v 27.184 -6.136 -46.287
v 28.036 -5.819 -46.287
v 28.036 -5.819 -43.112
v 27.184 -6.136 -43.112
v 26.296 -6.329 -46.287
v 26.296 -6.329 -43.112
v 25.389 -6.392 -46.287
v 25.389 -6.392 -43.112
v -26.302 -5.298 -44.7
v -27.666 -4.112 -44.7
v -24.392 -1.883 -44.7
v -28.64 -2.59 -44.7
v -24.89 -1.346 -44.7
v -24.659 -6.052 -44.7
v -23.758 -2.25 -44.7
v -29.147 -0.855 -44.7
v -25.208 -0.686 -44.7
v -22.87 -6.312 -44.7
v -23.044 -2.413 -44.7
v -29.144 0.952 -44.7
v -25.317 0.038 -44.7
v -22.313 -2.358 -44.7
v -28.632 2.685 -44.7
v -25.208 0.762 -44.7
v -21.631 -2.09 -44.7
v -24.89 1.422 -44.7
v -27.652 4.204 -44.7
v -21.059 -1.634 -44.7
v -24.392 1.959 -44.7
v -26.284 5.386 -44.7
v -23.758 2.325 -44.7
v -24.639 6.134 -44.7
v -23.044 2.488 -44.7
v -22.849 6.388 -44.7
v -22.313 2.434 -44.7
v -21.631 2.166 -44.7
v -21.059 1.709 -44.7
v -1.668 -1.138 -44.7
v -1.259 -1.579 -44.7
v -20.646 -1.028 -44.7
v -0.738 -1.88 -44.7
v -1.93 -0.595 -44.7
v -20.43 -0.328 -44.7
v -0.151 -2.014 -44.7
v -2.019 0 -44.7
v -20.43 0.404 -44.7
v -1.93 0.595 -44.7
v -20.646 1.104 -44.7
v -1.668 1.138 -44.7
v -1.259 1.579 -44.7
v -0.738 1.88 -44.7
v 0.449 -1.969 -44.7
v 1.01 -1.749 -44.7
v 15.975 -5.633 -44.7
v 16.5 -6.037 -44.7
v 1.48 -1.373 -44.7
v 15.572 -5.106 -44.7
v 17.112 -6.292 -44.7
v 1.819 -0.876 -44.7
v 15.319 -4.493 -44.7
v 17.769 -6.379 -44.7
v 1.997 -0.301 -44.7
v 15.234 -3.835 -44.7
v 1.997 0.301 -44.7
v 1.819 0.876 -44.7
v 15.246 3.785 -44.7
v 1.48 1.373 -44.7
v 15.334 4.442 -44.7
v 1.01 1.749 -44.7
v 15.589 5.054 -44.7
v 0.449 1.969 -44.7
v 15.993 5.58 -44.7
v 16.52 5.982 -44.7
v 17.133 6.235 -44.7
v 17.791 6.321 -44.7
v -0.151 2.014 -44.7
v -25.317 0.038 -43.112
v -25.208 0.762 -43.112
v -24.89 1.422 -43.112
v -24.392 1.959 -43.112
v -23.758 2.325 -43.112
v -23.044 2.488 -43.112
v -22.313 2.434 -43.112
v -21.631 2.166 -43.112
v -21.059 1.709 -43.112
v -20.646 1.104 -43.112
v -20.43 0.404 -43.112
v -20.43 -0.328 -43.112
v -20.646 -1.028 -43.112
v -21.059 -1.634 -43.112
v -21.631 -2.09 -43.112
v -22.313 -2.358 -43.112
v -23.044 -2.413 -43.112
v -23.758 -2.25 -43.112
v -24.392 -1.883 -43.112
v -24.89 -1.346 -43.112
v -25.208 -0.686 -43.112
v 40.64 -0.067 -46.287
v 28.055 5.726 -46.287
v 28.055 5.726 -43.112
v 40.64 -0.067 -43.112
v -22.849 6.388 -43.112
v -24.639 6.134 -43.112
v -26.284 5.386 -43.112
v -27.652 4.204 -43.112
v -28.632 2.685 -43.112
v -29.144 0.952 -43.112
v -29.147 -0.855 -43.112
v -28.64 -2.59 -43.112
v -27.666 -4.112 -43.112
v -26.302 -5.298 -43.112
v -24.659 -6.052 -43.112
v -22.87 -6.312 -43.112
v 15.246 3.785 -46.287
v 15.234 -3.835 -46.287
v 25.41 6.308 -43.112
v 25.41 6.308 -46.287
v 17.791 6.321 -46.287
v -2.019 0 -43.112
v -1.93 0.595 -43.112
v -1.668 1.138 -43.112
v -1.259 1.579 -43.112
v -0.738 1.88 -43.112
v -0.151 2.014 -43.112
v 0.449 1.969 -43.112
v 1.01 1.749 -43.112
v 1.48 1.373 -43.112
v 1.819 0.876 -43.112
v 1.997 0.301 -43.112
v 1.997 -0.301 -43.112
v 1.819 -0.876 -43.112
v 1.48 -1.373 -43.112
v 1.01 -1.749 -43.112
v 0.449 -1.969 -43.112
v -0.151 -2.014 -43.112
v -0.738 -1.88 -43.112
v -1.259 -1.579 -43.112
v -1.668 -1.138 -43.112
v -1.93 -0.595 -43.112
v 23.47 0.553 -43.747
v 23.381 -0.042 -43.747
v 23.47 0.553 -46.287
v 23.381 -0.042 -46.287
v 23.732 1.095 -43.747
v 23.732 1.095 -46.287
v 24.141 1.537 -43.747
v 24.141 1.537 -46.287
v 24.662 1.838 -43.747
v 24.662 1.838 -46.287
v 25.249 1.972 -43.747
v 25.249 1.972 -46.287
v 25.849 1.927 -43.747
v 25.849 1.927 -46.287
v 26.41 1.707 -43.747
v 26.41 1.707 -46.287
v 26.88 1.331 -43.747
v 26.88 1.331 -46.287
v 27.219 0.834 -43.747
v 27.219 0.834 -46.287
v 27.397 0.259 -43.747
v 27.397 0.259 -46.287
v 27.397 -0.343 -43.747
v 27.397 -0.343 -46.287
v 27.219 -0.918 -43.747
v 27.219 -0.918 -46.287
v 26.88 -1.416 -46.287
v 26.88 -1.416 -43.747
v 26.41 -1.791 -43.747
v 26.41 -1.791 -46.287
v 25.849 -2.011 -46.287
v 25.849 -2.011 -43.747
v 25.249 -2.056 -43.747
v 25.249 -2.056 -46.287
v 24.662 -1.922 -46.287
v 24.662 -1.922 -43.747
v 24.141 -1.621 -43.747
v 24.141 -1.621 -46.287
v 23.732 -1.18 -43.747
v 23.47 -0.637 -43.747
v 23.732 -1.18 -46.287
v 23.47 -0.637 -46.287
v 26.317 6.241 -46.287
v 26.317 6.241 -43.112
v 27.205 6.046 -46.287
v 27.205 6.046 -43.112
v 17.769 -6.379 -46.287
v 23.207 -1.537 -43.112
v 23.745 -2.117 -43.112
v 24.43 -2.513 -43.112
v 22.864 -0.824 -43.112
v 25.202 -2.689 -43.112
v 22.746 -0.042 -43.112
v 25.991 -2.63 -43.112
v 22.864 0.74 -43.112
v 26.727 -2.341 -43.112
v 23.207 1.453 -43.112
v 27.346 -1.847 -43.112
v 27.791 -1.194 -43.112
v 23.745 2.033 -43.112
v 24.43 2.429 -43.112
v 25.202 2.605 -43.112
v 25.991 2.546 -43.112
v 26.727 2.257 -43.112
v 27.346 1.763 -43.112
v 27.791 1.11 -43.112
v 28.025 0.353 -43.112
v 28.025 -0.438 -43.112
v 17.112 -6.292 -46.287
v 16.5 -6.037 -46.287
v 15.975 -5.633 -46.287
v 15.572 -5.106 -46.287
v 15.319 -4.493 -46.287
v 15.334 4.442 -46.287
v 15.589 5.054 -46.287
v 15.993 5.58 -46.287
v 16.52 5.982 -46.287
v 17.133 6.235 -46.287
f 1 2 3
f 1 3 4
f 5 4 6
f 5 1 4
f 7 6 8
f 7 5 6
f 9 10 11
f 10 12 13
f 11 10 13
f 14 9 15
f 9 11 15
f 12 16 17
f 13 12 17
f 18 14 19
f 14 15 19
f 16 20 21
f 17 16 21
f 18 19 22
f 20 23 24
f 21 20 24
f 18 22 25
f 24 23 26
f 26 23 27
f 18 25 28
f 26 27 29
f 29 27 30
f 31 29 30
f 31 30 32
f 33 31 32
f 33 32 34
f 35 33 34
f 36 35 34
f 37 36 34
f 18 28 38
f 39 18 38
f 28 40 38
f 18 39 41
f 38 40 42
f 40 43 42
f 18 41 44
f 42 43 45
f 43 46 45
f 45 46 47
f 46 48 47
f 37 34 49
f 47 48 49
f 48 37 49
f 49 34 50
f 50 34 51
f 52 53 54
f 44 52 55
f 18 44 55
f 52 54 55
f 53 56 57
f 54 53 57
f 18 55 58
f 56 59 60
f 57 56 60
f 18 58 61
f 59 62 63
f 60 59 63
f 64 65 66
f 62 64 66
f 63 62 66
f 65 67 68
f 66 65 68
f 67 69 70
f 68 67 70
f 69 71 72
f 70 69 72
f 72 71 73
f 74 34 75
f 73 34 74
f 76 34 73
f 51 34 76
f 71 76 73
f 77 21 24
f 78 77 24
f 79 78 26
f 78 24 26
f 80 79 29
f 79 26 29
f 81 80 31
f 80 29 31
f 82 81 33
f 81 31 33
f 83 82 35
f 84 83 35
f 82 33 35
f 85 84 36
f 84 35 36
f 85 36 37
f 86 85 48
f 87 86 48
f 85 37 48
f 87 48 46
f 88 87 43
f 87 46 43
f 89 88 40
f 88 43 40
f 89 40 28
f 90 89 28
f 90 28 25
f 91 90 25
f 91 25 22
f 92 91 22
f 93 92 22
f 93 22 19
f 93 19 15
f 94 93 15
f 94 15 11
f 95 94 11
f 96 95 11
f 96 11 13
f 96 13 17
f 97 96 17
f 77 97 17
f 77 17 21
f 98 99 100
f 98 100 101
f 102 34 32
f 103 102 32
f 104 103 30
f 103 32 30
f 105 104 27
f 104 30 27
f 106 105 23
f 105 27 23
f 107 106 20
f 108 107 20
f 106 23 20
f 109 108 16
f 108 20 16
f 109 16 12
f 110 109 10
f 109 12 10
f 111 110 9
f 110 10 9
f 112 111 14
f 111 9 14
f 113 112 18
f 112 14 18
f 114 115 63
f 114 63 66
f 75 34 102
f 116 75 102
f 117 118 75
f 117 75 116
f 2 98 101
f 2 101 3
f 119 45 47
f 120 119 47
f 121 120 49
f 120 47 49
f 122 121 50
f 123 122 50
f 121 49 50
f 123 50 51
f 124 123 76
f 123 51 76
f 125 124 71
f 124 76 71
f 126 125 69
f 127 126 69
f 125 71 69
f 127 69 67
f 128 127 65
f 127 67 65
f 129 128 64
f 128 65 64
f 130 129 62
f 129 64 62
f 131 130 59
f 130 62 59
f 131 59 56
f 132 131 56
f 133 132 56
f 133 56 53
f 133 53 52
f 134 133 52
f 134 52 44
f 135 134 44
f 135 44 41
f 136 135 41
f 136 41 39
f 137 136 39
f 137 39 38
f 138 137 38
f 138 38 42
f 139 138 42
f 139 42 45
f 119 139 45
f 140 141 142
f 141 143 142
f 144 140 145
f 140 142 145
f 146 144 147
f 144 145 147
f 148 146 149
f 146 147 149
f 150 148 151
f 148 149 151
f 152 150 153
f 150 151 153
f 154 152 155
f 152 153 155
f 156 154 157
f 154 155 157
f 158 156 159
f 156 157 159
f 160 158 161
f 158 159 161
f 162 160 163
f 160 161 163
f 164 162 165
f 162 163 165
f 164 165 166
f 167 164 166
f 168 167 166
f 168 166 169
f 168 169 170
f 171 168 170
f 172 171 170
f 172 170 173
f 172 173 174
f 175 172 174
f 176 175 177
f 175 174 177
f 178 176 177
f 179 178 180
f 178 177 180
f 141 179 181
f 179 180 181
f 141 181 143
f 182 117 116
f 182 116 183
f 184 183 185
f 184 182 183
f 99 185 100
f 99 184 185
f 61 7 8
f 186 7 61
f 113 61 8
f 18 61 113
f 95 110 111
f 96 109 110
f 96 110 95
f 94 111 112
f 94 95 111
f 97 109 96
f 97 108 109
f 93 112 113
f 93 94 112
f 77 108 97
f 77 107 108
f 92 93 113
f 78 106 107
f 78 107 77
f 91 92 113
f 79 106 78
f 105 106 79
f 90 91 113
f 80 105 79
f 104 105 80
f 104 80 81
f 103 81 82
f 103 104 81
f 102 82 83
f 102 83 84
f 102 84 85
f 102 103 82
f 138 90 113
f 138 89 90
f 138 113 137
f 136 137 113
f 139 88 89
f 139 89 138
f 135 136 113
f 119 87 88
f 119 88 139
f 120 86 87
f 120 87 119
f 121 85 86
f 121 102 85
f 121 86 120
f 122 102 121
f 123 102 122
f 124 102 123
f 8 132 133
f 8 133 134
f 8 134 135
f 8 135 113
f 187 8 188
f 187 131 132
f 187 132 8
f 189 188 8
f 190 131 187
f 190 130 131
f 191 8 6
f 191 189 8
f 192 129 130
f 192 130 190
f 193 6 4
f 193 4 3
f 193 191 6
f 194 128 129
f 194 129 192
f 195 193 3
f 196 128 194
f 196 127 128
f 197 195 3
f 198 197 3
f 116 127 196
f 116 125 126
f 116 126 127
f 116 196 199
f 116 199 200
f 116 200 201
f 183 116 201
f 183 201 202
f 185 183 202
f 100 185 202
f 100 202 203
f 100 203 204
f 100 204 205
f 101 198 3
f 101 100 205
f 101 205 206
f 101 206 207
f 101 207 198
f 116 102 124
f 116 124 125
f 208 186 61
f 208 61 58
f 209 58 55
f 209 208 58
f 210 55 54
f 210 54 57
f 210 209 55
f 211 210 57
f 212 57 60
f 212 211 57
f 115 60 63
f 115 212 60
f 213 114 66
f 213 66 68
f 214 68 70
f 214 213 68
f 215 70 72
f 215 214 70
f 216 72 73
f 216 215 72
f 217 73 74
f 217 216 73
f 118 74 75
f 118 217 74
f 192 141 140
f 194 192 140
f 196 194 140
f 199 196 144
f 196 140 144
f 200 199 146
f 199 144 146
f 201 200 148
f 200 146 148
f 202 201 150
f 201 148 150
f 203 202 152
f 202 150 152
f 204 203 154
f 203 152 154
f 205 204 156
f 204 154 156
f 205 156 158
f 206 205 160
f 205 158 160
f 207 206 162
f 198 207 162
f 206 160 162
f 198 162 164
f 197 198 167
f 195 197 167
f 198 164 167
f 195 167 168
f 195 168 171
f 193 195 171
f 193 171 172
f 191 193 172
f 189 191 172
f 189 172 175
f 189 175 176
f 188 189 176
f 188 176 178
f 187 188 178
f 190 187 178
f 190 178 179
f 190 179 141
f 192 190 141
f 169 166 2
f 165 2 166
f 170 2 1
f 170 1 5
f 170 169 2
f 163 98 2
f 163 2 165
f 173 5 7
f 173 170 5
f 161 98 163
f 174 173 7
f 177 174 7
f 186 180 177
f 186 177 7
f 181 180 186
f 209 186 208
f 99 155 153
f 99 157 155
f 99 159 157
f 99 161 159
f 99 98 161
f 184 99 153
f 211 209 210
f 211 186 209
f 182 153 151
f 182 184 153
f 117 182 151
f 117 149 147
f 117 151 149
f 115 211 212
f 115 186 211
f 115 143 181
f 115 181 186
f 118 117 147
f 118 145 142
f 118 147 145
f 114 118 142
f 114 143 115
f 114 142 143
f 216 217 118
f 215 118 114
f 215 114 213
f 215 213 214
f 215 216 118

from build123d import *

# Parameters (mm, degrees)
SKETCH2_R                        = 0.635
SKETCH2_R_2                      = 1.5875
BOSS_EXTRUDE1_DEPTH              = 1.5875
F_10_0_1935_DIAMETER_HOLE1_D     = 4.9149
BOSS_EXTRUDE2_START              = 1.5875
BOSS_EXTRUDE2_DEPTH              = 1.5875
F_10_32_TAPPED_HOLE1_D           = 4.0386
F_10_32_TAPPED_HOLE1_DEPTH       = 9.398
F_10_32_TAPPED_HOLE1_CSINK_D     = 5.3086
F_10_32_TAPPED_HOLE1_CSINK_ANGLE = 90
F_10_32_TAPPED_HOLE1_TIP         = 1.213317848
BOSS_EXTRUDE3_START              = -3.175
BOSS_EXTRUDE3_DEPTH              = 3.175
F_10_32_TAPPED_HOLE2_D           = 4.0386


with BuildPart() as part:
    # Sketch2 → Boss-Extrude1 (new body)
    with BuildSketch(Plane.XY.offset(-44.699989247)):
        with BuildLine():
            Line((-22.87049754, -6.312086997), (25.389436119, -6.392107131))
            ThreePointArc((25.389436119, -6.392107131), (31.749956355, -0.052644824), (25.410494049, 6.307875411))
            Line((25.410494049, 6.307875411), (-22.84943961, 6.387895545))
            ThreePointArc((-22.84943961, 6.387895545), (-29.209959846, 0.048433239), (-22.87049754, -6.312086997))
        make_face()
        with Locations((25.399965084, -0.04211586)):
            Circle(SKETCH2_R, mode=Mode.SUBTRACT)
        Circle(SKETCH2_R_2, mode=Mode.SUBTRACT)
        with Locations((-22.859968575, 0.037904274)):
            Circle(SKETCH2_R, mode=Mode.SUBTRACT)
    extrude(amount=BOSS_EXTRUDE1_DEPTH)

    # #10 (0.1935) Diameter Hole1 (through all)
    with Locations(Plane.XY.offset(-43.112489247)):
        with Locations((-22.859968575, 0.037904274)):
            Hole(F_10_0_1935_DIAMETER_HOLE1_D / 2)

    # Sketch5 → Boss-Extrude2 (add)
    with BuildSketch(Plane(origin=(0, 0, -44.699989247), x_dir=(-1, 0, 0), z_dir=(0, 0, -1)).offset(BOSS_EXTRUDE2_START)):
        with BuildLine():
            Line((-25.389436119, -6.392107131), (-17.769446594, -6.379472373))
            ThreePointArc((-17.769446594, -6.379472373), (-15.974631383, -5.632546579), (-15.233661671, -3.835264278))
            Line((-15.233661671, -3.835264278), (-15.246296429, 3.784725247))
            ThreePointArc((-15.246296429, 3.784725247), (-15.993222223, 5.579540457), (-17.790504524, 6.320510169))
            Line((-17.790504524, 6.320510169), (-25.410494049, 6.307875411))
            ThreePointArc((-25.410494049, 6.307875411), (-31.749956355, -0.052644824), (-25.389436119, -6.392107131))
        make_face()
    extrude(amount=-BOSS_EXTRUDE2_DEPTH)

    # #10-32 Tapped Hole1
    with Locations(Plane.XY.offset(-43.112489247)):
        with Locations((25.399965084, -0.04211586)):
            CounterSinkHole(F_10_32_TAPPED_HOLE1_D / 2, F_10_32_TAPPED_HOLE1_CSINK_D / 2, depth=F_10_32_TAPPED_HOLE1_DEPTH, counter_sink_angle=F_10_32_TAPPED_HOLE1_CSINK_ANGLE)
            with Locations((0, 0, -(F_10_32_TAPPED_HOLE1_DEPTH + F_10_32_TAPPED_HOLE1_TIP / 2))):  # 118° drill point
                Cone(0, F_10_32_TAPPED_HOLE1_D / 2, F_10_32_TAPPED_HOLE1_TIP, mode=Mode.SUBTRACT)

    # Sketch8 → Boss-Extrude3 (add)
    with BuildSketch(Plane.XY.offset(-43.112489247).offset(BOSS_EXTRUDE3_START)):
        with BuildLine():
            Line((28.055366234, 5.726015964), (40.639944134, -0.067385375))
            Line((40.639944134, -0.067385375), (28.036223326, -5.81902182))
            ThreePointArc((28.036223326, -5.81902182), (31.749956355, -0.052644824), (28.055366234, 5.726015964))
        make_face()
    extrude(amount=BOSS_EXTRUDE3_DEPTH)

    # #10-32 Tapped Hole2 (through all)
    with Locations(Plane.XY.offset(-43.112489247)):
        with Locations((0, 0)):
            Hole(F_10_32_TAPPED_HOLE2_D / 2)


solid = part.part
